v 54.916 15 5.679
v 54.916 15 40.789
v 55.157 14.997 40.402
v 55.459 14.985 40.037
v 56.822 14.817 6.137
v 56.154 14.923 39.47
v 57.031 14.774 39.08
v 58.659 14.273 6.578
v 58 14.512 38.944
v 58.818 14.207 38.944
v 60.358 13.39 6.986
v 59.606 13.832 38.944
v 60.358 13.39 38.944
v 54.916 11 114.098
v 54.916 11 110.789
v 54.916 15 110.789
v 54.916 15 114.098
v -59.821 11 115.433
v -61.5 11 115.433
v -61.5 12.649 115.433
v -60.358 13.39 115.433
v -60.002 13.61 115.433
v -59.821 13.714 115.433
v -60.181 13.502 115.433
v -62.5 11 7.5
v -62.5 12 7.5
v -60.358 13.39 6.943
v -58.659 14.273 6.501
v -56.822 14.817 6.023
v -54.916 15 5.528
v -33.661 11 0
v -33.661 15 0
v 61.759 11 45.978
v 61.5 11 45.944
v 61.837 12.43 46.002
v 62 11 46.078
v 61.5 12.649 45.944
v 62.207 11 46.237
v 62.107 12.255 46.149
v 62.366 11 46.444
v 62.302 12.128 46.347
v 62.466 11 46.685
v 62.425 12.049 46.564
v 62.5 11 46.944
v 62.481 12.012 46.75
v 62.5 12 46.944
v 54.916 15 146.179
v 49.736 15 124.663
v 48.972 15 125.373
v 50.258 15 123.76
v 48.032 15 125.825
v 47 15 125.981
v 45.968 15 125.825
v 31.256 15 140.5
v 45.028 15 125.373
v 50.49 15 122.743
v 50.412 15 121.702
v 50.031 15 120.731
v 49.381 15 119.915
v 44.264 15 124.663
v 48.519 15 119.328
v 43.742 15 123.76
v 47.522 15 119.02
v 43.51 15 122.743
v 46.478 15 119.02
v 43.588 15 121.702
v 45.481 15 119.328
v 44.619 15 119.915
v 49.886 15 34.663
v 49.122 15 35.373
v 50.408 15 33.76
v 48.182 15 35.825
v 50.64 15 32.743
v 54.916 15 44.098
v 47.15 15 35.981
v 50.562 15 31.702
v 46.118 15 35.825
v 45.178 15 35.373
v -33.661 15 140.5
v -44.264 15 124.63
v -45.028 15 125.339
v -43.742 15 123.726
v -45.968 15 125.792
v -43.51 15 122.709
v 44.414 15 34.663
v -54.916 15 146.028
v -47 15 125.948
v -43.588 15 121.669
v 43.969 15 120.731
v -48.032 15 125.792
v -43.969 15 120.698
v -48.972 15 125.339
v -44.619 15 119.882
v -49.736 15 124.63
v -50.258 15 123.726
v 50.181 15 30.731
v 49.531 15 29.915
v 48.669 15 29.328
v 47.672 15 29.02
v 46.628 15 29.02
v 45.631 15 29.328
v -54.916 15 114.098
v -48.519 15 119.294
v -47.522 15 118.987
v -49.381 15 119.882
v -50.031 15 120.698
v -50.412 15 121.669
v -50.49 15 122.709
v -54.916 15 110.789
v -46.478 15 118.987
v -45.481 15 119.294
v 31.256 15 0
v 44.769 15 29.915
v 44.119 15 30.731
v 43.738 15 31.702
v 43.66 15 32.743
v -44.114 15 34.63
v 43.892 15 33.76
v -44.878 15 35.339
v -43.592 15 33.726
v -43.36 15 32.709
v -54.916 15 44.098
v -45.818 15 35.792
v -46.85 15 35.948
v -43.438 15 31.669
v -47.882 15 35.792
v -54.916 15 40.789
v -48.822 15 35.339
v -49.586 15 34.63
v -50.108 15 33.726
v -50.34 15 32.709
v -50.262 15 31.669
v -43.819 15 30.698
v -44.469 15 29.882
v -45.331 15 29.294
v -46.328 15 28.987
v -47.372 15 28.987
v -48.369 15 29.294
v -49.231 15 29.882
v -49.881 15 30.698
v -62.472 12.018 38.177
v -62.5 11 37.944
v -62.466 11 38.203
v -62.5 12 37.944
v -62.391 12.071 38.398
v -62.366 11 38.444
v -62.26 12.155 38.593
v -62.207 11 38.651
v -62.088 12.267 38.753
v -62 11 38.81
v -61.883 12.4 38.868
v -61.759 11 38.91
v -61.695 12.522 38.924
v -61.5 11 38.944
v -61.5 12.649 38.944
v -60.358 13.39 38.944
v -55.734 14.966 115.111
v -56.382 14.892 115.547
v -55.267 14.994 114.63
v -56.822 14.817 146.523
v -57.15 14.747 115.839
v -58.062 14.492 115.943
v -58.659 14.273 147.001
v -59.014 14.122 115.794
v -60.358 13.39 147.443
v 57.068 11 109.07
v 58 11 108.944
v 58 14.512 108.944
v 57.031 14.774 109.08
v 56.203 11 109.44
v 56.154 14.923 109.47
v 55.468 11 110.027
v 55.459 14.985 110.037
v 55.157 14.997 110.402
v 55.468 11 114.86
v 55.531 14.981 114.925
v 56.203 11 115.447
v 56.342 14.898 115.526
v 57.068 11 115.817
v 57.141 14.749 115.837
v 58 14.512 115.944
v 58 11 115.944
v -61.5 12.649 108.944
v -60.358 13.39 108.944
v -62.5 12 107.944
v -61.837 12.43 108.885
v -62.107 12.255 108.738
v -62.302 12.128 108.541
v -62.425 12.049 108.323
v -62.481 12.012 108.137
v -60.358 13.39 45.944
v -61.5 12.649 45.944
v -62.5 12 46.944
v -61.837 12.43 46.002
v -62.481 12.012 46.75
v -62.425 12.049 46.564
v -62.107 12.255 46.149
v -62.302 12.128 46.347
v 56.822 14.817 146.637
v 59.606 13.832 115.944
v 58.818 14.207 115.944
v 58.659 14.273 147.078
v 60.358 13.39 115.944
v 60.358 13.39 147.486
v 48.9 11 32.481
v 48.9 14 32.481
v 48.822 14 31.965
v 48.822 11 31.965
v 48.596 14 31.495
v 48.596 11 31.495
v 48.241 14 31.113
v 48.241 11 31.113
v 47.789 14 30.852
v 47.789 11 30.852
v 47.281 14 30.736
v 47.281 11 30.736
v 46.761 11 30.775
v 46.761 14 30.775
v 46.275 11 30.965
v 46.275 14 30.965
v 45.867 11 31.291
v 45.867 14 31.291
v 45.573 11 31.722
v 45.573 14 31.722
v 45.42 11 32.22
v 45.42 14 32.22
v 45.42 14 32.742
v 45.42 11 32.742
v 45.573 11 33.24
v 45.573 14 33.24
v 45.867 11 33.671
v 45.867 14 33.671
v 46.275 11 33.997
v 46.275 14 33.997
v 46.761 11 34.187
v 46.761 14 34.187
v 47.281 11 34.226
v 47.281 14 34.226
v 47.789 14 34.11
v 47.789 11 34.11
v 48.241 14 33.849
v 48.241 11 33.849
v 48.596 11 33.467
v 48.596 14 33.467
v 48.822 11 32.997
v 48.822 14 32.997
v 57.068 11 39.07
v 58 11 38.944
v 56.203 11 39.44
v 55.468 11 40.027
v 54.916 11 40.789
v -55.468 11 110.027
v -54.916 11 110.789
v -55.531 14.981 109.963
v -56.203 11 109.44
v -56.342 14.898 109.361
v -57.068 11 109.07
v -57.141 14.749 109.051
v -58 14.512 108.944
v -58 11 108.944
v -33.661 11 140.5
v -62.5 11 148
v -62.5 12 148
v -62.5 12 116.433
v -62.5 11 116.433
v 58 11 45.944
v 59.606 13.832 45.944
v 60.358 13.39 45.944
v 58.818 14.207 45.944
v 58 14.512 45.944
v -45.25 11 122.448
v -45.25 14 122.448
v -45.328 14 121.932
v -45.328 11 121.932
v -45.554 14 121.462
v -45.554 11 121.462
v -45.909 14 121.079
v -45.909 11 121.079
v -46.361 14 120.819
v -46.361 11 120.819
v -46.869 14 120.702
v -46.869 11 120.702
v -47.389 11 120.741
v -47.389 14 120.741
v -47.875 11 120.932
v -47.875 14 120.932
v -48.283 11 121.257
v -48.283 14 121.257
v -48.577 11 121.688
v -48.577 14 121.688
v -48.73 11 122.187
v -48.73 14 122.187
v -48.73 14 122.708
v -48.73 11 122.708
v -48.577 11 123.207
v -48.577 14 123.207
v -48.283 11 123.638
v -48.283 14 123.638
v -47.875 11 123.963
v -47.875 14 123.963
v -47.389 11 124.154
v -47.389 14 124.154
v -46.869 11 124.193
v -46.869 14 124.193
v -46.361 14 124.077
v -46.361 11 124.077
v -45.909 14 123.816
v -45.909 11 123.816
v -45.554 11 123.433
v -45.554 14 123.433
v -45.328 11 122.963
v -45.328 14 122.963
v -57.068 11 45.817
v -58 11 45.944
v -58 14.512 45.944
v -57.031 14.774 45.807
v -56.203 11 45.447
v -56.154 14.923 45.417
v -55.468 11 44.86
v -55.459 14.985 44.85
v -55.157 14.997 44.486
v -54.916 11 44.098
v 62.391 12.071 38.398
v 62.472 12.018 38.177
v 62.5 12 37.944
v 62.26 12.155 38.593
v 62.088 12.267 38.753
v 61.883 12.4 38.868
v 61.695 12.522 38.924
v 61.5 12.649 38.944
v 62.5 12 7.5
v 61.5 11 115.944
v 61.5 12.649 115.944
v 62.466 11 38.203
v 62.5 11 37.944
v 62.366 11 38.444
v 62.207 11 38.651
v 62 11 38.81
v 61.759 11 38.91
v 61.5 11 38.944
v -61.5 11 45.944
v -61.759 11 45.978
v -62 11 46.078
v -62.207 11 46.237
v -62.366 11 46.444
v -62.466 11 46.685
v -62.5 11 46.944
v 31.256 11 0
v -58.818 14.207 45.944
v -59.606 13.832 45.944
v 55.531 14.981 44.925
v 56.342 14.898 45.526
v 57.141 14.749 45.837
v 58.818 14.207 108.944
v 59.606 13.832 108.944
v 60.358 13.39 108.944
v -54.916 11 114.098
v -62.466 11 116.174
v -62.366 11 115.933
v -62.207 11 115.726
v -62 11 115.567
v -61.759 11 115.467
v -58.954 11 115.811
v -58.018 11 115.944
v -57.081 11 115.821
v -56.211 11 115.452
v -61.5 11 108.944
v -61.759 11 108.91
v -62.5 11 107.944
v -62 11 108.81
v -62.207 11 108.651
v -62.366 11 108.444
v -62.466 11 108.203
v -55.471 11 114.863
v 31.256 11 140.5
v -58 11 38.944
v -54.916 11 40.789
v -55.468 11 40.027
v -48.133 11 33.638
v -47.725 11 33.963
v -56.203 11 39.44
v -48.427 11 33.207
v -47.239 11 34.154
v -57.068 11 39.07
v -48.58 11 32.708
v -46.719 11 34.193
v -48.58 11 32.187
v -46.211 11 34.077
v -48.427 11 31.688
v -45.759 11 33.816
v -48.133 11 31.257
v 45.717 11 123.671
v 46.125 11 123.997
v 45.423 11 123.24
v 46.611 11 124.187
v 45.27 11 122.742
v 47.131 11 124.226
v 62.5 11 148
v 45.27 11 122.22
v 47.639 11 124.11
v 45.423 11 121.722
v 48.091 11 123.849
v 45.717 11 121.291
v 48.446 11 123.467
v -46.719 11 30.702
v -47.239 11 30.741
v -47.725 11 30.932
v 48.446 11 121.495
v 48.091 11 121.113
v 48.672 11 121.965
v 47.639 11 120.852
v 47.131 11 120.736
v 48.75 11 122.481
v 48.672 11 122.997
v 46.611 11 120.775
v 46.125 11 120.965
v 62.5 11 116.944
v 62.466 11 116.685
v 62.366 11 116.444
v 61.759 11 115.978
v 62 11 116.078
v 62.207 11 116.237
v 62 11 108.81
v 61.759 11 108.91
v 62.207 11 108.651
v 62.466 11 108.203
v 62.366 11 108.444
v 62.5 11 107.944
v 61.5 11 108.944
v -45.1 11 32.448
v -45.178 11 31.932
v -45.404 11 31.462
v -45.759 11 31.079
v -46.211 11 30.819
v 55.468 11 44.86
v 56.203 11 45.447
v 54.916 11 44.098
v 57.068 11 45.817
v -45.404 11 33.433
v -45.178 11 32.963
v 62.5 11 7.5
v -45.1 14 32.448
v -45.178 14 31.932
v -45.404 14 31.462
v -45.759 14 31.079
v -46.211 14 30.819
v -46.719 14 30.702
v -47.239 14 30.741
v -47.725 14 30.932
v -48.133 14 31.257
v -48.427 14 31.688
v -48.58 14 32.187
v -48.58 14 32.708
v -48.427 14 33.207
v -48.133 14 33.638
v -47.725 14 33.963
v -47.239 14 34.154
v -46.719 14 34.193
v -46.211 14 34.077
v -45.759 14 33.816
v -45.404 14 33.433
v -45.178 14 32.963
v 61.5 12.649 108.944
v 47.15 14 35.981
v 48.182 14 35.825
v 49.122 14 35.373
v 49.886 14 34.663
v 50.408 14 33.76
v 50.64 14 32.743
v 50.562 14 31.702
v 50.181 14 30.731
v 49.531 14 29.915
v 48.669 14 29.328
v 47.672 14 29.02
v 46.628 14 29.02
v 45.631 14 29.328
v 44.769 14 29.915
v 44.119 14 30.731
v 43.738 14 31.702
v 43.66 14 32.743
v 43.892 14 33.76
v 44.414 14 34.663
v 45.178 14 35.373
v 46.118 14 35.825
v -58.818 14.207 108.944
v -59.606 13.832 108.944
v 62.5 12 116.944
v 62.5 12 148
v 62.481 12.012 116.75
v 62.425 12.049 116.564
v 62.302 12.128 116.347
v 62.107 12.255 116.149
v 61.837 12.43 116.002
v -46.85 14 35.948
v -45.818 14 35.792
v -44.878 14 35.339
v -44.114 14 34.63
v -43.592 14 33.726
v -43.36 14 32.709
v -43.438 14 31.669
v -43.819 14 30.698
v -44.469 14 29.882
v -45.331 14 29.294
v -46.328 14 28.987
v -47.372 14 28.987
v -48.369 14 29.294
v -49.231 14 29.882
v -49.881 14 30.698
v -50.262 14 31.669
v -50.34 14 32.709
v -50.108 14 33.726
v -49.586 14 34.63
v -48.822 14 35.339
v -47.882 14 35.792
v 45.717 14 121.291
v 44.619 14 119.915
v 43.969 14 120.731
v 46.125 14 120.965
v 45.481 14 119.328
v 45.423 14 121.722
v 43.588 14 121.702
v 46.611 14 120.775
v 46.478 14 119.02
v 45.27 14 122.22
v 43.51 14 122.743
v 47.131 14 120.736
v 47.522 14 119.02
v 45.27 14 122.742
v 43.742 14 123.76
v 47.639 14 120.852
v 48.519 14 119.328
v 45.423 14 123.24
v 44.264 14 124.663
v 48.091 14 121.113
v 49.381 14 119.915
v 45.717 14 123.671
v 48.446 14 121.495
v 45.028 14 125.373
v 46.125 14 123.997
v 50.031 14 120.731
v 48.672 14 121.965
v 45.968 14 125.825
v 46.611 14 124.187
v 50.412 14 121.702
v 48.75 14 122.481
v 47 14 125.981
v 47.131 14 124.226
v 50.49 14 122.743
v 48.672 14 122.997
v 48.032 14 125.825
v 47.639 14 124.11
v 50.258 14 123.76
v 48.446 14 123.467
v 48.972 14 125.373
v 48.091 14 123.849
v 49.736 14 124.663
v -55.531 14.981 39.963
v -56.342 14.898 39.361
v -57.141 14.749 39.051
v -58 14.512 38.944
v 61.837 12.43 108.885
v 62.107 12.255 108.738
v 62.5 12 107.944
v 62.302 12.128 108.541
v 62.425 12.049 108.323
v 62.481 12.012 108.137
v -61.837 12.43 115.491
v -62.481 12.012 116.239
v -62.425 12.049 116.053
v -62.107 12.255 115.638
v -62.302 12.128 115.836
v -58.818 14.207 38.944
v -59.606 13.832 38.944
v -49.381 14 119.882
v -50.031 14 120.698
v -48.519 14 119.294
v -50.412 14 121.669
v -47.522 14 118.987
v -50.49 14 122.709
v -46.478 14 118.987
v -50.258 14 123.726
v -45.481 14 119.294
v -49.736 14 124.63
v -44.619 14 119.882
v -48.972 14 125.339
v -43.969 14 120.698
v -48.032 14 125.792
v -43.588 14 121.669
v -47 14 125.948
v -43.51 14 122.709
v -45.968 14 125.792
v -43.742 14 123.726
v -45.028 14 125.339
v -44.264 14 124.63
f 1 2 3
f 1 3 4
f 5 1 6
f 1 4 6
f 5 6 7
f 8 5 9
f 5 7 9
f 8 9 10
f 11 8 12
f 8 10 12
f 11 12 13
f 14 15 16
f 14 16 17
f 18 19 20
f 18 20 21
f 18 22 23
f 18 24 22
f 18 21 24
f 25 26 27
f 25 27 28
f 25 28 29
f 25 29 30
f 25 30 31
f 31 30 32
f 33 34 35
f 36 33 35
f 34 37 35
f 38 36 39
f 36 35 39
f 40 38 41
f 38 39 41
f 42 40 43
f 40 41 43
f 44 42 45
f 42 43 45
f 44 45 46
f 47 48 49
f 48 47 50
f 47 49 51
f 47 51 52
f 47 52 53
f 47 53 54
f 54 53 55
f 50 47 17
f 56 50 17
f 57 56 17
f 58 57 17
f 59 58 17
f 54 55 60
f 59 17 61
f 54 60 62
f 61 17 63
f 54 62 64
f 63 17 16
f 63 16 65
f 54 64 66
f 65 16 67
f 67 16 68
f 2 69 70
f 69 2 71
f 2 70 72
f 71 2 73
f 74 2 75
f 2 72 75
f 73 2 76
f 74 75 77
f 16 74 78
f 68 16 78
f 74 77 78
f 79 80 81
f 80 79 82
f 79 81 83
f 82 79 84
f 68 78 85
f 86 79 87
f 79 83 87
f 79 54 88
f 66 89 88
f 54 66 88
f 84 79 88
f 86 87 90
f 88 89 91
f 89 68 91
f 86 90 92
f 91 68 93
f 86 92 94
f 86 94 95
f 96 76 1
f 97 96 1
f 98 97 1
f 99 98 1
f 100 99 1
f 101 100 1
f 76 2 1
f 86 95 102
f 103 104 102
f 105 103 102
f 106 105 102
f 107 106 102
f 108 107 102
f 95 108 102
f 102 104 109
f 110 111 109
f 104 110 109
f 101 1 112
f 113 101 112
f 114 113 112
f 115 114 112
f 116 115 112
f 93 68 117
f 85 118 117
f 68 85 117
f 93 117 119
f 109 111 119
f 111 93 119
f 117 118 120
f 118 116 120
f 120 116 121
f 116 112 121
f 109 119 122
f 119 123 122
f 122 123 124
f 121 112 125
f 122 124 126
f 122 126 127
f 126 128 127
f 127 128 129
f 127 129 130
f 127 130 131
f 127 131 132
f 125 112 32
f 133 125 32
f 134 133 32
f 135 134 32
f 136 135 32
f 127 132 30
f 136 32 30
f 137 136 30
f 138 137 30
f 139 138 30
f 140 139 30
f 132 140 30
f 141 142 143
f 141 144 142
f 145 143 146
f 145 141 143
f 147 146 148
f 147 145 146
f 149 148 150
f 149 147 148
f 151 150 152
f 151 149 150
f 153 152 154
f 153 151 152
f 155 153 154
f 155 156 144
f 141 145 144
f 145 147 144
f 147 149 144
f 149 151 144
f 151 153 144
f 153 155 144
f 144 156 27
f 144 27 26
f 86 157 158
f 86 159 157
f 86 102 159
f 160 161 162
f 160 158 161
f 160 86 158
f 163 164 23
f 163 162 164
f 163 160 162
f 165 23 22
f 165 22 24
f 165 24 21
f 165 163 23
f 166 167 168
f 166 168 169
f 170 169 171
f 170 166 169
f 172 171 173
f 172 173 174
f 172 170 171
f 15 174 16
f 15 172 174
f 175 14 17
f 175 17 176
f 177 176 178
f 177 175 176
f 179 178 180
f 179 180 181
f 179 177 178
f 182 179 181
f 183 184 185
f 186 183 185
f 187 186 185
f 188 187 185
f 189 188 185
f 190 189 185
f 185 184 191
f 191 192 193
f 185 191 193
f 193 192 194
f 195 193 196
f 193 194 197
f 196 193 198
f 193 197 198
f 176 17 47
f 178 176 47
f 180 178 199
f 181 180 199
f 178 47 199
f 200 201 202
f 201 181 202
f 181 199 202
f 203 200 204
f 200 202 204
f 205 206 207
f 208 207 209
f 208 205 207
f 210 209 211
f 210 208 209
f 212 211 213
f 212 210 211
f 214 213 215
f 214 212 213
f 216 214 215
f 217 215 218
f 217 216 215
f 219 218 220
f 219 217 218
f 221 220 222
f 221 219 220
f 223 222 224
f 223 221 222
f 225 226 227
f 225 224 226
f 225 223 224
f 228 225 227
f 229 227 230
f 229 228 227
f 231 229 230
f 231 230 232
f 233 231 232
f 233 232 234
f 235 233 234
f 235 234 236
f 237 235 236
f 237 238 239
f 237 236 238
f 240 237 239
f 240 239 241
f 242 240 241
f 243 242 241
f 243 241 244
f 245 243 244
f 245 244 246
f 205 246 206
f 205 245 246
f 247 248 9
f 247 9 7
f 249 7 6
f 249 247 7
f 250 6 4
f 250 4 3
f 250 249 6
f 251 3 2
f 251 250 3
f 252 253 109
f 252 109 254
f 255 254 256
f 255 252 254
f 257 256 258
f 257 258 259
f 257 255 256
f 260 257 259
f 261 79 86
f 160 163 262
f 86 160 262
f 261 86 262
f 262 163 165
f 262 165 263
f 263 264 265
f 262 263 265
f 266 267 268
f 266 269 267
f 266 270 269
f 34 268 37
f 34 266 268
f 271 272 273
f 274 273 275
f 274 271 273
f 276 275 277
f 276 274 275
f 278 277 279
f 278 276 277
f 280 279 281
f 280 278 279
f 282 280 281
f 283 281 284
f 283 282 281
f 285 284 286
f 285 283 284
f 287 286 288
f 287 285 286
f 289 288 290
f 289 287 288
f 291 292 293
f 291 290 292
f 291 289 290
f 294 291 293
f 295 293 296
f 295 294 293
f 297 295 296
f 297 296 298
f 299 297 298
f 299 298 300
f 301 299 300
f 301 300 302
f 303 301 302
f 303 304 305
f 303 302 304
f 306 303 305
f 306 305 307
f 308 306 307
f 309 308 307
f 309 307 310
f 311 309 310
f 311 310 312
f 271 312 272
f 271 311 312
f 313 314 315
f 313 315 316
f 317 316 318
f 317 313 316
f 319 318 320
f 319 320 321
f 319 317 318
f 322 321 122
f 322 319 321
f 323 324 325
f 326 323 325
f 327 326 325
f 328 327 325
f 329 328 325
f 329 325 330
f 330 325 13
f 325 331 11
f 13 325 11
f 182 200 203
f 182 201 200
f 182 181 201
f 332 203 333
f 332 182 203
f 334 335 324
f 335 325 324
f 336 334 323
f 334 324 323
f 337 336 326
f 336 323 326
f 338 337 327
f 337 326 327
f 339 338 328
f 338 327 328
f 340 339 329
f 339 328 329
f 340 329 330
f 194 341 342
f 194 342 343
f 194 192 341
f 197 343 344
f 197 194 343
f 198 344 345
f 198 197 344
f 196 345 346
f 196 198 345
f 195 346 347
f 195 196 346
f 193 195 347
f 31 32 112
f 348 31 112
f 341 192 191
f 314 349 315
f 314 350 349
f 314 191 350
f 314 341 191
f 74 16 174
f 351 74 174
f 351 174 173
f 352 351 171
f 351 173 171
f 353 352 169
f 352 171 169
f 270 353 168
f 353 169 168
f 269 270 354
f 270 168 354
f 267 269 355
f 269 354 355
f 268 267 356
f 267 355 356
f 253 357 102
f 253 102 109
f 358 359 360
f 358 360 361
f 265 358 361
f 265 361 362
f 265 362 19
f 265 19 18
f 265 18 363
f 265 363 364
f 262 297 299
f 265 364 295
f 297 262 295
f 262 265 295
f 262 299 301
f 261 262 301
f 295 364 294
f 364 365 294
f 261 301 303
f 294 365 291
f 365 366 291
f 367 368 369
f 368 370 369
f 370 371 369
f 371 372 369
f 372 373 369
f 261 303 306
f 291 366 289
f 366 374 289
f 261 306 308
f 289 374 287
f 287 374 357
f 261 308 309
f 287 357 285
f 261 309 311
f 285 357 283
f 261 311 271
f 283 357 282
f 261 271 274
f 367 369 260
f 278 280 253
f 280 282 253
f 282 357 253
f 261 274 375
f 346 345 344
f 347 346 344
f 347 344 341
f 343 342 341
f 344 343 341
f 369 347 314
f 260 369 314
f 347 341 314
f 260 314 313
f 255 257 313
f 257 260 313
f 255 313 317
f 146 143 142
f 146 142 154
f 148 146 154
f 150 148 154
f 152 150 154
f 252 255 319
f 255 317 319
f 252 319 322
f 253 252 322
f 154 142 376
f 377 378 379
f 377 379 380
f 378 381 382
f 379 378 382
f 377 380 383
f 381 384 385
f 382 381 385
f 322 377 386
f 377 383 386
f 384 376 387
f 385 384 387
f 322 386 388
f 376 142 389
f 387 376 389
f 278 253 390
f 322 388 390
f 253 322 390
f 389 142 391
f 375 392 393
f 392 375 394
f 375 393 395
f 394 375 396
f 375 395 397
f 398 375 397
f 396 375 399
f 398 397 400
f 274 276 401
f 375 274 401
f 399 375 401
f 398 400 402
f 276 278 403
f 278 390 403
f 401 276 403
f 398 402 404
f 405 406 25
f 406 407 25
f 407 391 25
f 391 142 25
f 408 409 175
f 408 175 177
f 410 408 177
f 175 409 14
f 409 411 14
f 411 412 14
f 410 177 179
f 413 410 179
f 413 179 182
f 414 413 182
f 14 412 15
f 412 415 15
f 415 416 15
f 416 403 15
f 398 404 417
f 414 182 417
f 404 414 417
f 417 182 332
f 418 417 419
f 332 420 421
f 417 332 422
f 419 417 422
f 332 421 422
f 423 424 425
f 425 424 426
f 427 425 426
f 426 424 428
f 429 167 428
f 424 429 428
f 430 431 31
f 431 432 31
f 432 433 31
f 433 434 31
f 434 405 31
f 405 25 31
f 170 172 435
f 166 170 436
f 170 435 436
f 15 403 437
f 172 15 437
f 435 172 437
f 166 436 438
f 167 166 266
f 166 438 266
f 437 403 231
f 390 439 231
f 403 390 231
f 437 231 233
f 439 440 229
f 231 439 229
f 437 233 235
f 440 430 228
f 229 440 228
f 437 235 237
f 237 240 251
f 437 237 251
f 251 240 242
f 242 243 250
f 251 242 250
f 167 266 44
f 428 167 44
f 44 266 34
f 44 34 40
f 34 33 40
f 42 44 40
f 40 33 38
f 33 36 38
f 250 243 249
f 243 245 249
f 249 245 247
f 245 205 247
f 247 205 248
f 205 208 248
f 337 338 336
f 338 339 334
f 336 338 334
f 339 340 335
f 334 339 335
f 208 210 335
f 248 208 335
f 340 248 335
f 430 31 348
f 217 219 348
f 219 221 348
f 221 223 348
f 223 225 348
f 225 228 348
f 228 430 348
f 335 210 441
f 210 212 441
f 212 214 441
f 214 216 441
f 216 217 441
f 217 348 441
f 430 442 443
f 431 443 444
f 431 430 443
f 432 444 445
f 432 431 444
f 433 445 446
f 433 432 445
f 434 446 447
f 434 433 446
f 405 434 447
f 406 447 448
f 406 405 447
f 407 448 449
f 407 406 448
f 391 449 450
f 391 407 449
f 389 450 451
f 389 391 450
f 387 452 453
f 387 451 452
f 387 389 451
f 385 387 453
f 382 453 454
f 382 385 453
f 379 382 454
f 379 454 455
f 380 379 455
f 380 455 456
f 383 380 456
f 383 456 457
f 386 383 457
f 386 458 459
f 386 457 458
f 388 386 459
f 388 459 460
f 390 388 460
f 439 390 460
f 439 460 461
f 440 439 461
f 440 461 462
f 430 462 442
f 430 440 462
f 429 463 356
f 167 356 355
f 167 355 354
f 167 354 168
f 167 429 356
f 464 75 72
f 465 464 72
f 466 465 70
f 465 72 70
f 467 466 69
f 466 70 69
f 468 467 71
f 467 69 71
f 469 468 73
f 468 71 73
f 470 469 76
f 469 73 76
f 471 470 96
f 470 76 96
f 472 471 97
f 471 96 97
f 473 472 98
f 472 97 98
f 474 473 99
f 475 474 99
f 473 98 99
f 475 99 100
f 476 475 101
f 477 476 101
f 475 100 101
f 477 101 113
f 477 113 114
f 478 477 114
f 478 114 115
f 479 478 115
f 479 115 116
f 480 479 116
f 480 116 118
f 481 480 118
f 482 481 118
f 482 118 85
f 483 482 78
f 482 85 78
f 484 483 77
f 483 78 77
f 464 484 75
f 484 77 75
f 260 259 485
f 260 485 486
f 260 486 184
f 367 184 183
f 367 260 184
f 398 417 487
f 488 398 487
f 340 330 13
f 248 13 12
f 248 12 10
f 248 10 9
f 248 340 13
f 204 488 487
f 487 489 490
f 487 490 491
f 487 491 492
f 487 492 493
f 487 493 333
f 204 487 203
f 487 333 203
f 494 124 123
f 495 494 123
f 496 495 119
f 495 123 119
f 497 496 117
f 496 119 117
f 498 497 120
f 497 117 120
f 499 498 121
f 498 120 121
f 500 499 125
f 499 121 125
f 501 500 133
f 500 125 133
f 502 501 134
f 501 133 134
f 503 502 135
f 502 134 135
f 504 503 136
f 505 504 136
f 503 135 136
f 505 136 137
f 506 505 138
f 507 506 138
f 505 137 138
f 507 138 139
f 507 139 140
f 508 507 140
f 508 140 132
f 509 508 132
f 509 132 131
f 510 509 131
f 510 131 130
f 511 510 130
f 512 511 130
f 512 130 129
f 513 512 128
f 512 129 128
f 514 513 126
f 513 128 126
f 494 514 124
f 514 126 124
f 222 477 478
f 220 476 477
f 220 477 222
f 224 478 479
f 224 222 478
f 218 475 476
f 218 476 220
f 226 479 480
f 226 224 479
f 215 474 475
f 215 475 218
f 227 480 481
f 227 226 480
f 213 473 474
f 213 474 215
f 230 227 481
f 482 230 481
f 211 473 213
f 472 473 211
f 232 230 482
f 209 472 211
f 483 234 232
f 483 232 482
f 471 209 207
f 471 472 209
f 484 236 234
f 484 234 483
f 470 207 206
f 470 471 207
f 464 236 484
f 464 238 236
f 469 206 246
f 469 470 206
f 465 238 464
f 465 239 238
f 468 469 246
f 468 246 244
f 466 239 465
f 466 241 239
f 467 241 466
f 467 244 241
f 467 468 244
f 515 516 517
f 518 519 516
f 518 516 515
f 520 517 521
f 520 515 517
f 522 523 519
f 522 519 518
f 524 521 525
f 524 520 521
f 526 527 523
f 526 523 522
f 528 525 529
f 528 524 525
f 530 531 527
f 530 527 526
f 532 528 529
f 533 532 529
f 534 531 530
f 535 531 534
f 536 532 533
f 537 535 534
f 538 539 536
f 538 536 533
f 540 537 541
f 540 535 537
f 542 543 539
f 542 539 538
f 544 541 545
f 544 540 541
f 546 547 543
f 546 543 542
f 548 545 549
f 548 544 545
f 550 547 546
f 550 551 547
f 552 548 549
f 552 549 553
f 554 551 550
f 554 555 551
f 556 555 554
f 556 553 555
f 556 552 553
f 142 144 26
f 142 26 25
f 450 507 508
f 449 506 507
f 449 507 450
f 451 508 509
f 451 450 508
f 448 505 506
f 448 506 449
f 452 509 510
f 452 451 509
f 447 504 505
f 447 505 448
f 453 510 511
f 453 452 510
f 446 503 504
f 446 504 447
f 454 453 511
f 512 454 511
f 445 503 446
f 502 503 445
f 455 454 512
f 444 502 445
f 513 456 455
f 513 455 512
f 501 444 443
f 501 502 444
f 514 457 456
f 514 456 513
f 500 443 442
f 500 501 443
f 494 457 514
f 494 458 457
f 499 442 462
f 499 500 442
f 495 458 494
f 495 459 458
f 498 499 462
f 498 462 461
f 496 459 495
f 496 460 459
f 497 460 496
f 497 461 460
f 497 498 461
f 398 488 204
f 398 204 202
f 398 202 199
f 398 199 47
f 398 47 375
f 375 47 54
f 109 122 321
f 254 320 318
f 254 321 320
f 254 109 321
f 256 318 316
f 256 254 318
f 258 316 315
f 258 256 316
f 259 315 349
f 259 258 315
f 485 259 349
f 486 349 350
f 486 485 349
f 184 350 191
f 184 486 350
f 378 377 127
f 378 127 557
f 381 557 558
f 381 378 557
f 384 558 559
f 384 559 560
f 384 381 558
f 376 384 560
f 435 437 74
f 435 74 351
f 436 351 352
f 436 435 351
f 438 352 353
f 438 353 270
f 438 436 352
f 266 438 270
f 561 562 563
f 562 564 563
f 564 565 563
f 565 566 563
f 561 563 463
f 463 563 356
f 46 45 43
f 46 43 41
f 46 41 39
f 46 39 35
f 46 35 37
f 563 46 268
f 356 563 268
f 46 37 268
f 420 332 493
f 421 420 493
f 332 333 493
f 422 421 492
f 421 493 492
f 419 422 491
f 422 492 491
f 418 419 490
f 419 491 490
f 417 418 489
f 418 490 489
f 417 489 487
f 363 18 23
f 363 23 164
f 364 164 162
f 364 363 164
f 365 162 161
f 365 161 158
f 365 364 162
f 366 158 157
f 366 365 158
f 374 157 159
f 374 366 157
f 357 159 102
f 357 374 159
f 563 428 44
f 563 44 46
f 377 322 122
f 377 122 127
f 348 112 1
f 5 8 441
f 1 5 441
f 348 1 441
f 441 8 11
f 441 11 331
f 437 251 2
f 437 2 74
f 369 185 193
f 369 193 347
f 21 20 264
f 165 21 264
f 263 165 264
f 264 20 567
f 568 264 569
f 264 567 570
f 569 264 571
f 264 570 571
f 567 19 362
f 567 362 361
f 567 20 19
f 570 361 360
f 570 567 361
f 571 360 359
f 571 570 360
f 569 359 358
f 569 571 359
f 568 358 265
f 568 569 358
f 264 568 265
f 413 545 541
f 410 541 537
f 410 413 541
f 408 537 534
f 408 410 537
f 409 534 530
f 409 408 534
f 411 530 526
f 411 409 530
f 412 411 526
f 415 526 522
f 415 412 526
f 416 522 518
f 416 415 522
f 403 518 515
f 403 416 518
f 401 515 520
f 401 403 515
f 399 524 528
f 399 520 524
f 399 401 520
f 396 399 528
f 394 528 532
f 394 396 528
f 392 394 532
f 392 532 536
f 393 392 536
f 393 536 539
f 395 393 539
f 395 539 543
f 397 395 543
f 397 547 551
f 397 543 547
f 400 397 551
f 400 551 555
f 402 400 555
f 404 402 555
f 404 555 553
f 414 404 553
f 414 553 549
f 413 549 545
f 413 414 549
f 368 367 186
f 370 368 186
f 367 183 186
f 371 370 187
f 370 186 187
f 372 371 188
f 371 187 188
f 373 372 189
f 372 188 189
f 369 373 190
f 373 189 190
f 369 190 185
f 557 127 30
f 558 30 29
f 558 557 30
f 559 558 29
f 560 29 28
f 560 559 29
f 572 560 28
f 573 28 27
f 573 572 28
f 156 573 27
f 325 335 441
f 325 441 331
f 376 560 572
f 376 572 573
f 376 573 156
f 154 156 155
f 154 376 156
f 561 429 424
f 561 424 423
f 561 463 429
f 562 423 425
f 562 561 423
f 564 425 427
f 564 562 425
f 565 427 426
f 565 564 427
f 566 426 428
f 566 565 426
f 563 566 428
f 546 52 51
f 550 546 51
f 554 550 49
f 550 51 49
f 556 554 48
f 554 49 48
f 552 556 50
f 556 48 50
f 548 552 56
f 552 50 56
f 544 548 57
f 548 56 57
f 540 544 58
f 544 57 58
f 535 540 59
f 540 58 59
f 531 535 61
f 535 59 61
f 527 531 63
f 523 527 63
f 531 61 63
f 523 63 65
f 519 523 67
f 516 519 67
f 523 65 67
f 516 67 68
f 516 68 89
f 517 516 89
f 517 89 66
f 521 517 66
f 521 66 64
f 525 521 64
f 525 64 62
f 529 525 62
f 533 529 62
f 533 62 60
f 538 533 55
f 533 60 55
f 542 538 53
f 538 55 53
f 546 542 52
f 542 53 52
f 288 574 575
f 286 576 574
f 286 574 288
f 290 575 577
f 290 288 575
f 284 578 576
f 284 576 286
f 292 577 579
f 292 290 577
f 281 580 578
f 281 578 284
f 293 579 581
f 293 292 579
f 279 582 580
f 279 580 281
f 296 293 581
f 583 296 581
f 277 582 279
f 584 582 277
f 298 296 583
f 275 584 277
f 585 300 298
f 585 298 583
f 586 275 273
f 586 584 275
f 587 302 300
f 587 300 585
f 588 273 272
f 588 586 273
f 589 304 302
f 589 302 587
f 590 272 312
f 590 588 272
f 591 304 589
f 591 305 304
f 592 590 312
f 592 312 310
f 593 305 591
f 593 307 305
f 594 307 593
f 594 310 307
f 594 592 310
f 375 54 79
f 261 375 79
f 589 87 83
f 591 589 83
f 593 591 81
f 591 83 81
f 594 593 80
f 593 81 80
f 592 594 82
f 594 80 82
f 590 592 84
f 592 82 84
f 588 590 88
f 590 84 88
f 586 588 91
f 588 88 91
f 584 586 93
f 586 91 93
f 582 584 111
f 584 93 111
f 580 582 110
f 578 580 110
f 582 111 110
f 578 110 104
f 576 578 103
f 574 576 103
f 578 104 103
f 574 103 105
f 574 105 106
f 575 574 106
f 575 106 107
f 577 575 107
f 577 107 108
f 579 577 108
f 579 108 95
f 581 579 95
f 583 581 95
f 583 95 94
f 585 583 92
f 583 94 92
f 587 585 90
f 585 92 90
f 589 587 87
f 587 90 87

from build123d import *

# Parameters (mm, degrees)
BOSS_EXTRUDE1_DEPTH    = 148
FILLET1_R              = 10
CUT_EXTRUDE1_DEPTH     = 10
CUT_EXTRUDE2_START     = -4
CUT_EXTRUDE2_OUTLINE_R = 1.75
CUT_EXTRUDE2_DEPTH     = 4
SKETCH4_R              = 3.5
CUT_EXTRUDE3_DEPTH     = 1
FILLET2_R              = 1


# Read off the part's stored shape, not the designer's step: Cut-Extrude2
with BuildPart() as part:
    # Sketch1 → Boss-Extrude1 (new body)
    with BuildSketch(Plane.XY):
        Polygon((57.875, 15), (-57.875, 15), (-62.5, 12), (-62.5, 11), (62.5, 11), (62.5, 12), align=None)
    extrude(amount=BOSS_EXTRUDE1_DEPTH)

    # Fillet1
    fillet1_edges = [part.edges().sort_by_distance(p)[0] for p in [
        (-57.875, 15, 74),
        (57.875, 15, 74),
    ]]
    fillet(fillet1_edges, radius=FILLET1_R)

    # Sketch2 → Cut-Extrude1 (cut)
    with BuildSketch(Plane(origin=(0, 15, 0), x_dir=(1, 0, 0), z_dir=(0, 1, 0))):
        Polygon((-62.5, -7.5), (-33.66084425, 0), (31.256498232, 0), (62.5, -7.5), (62.5, 0), (31.256498232, 7.5), (-33.66084425, 7.5), (-62.5, 0), align=None)
        Polygon((31.256498232, -148), (62.5, -155.5), (62.5, -148), (31.256498232, -140.5), (-33.66084425, -140.5), (-62.5, -148), (-62.5, -155.5), (-33.66084425, -148), align=None)
    extrude(amount=-CUT_EXTRUDE1_DEPTH, mode=Mode.SUBTRACT)

    # Cut-Extrude2 outline → Cut-Extrude2 (cut)
    with BuildSketch(Plane(origin=(0, 15, 0), x_dir=(1, 0, 0), z_dir=(0, 1, 0)).offset(CUT_EXTRUDE2_START)):
        with BuildLine():
            Line((-62.5, -38.943696852), (-62.5, -45.943696852))
            Line((-62.5, -45.943696852), (-57.999999085, -45.943696852))
            ThreePointArc((-57.999999085, -45.943696852), (-56.202906175, -45.447104429), (-54.915769107, -44.098243751))
            Line((-54.915769107, -44.098243751), (-54.915769107, -40.789149953))
            ThreePointArc((-54.915769107, -40.789149953), (-56.202906175, -39.440289275), (-57.999999085, -38.943696852))
            Line((-57.999999085, -38.943696852), (-62.5, -38.943696852))
        make_face()
        with BuildLine():
            Line((-62.5, -115.432850877), (-59.820701756, -115.432850877))
            ThreePointArc((-59.820701756, -115.432850877), (-57.081076151, -115.820911776), (-54.915769107, -114.098243751))
            Line((-54.915769107, -114.098243751), (-54.915769107, -110.789149953))
            ThreePointArc((-54.915769107, -110.789149953), (-56.202906175, -109.440289275), (-57.999999085, -108.943696852))
            Line((-57.999999085, -108.943696852), (-62.5, -108.943696852))
            Line((-62.5, -108.943696852), (-62.5, -115.432850877))
        make_face()
        with BuildLine():
            Line((57.999999085, -45.943696852), (62.5, -45.943696852))
            Line((62.5, -45.943696852), (62.5, -38.943696852))
            Line((62.5, -38.943696852), (57.999999085, -38.943696852))
            ThreePointArc((57.999999085, -38.943696852), (56.202906175, -39.440289275), (54.915769107, -40.789149953))
            Line((54.915769107, -40.789149953), (54.915769107, -44.098243751))
            ThreePointArc((54.915769107, -44.098243751), (56.202906175, -45.447104429), (57.999999085, -45.943696852))
        make_face()
        with BuildLine():
            Line((62.5, -108.943696852), (57.999999085, -108.943696852))
            ThreePointArc((57.999999085, -108.943696852), (56.202906175, -109.440289275), (54.915769107, -110.789149953))
            Line((54.915769107, -110.789149953), (54.915769107, -114.098243751))
            ThreePointArc((54.915769107, -114.098243751), (56.202906175, -115.447104429), (57.999999085, -115.943696852))
            Line((57.999999085, -115.943696852), (62.5, -115.943696852))
            Line((62.5, -115.943696852), (62.5, -108.943696852))
        make_face()
        with Locations((47.15, -32.480990458)):
            Circle(CUT_EXTRUDE2_OUTLINE_R)
        with Locations((-47, -122.447604366)):
            Circle(CUT_EXTRUDE2_OUTLINE_R)
        with Locations((46.999994071, -122.480990458)):
            Circle(CUT_EXTRUDE2_OUTLINE_R)
        with Locations((-46.85, -32.447604366)):
            Circle(CUT_EXTRUDE2_OUTLINE_R)
    extrude(amount=CUT_EXTRUDE2_DEPTH, mode=Mode.SUBTRACT)

    # Sketch4 → Cut-Extrude3 (cut)
    with BuildSketch(Plane(origin=(0, 15, 0), x_dir=(1, 0, 0), z_dir=(0, 1, 0))):
        with Locations(Location((-46.85, -32.447604366, 0), (0, 0, 270))):
            Circle(SKETCH4_R)
        with Locations(Location((47.15, -32.480990458, 0), (0, 0, 270))):
            Circle(SKETCH4_R)
        with Locations(Location((-47, -122.447604366, 0), (0, 0, 270))):
            Circle(SKETCH4_R)
        with Locations(Location((46.999994071, -122.480990458, 0), (0, 0, 270))):
            Circle(SKETCH4_R)
    extrude(amount=-CUT_EXTRUDE3_DEPTH, mode=Mode.SUBTRACT)

    # Fillet2
    fillet2_edges = [part.edges().sort_by_distance(p)[0] for p in [
        (62.5, 11.5, 115.943696852),
        (62.5, 11.5, 108.943696852),
        (-62.5, 11.5, 45.943696852),
        (-62.5, 11.5, 38.943696852),
        (-62.5, 11.5, 115.432850877),
        (-62.5, 11.5, 108.943696852),
        (62.5, 11.5, 45.943696852),
        (62.5, 11.5, 38.943696852),
    ]]
    fillet(fillet2_edges, radius=FILLET2_R)


solid = part.part
